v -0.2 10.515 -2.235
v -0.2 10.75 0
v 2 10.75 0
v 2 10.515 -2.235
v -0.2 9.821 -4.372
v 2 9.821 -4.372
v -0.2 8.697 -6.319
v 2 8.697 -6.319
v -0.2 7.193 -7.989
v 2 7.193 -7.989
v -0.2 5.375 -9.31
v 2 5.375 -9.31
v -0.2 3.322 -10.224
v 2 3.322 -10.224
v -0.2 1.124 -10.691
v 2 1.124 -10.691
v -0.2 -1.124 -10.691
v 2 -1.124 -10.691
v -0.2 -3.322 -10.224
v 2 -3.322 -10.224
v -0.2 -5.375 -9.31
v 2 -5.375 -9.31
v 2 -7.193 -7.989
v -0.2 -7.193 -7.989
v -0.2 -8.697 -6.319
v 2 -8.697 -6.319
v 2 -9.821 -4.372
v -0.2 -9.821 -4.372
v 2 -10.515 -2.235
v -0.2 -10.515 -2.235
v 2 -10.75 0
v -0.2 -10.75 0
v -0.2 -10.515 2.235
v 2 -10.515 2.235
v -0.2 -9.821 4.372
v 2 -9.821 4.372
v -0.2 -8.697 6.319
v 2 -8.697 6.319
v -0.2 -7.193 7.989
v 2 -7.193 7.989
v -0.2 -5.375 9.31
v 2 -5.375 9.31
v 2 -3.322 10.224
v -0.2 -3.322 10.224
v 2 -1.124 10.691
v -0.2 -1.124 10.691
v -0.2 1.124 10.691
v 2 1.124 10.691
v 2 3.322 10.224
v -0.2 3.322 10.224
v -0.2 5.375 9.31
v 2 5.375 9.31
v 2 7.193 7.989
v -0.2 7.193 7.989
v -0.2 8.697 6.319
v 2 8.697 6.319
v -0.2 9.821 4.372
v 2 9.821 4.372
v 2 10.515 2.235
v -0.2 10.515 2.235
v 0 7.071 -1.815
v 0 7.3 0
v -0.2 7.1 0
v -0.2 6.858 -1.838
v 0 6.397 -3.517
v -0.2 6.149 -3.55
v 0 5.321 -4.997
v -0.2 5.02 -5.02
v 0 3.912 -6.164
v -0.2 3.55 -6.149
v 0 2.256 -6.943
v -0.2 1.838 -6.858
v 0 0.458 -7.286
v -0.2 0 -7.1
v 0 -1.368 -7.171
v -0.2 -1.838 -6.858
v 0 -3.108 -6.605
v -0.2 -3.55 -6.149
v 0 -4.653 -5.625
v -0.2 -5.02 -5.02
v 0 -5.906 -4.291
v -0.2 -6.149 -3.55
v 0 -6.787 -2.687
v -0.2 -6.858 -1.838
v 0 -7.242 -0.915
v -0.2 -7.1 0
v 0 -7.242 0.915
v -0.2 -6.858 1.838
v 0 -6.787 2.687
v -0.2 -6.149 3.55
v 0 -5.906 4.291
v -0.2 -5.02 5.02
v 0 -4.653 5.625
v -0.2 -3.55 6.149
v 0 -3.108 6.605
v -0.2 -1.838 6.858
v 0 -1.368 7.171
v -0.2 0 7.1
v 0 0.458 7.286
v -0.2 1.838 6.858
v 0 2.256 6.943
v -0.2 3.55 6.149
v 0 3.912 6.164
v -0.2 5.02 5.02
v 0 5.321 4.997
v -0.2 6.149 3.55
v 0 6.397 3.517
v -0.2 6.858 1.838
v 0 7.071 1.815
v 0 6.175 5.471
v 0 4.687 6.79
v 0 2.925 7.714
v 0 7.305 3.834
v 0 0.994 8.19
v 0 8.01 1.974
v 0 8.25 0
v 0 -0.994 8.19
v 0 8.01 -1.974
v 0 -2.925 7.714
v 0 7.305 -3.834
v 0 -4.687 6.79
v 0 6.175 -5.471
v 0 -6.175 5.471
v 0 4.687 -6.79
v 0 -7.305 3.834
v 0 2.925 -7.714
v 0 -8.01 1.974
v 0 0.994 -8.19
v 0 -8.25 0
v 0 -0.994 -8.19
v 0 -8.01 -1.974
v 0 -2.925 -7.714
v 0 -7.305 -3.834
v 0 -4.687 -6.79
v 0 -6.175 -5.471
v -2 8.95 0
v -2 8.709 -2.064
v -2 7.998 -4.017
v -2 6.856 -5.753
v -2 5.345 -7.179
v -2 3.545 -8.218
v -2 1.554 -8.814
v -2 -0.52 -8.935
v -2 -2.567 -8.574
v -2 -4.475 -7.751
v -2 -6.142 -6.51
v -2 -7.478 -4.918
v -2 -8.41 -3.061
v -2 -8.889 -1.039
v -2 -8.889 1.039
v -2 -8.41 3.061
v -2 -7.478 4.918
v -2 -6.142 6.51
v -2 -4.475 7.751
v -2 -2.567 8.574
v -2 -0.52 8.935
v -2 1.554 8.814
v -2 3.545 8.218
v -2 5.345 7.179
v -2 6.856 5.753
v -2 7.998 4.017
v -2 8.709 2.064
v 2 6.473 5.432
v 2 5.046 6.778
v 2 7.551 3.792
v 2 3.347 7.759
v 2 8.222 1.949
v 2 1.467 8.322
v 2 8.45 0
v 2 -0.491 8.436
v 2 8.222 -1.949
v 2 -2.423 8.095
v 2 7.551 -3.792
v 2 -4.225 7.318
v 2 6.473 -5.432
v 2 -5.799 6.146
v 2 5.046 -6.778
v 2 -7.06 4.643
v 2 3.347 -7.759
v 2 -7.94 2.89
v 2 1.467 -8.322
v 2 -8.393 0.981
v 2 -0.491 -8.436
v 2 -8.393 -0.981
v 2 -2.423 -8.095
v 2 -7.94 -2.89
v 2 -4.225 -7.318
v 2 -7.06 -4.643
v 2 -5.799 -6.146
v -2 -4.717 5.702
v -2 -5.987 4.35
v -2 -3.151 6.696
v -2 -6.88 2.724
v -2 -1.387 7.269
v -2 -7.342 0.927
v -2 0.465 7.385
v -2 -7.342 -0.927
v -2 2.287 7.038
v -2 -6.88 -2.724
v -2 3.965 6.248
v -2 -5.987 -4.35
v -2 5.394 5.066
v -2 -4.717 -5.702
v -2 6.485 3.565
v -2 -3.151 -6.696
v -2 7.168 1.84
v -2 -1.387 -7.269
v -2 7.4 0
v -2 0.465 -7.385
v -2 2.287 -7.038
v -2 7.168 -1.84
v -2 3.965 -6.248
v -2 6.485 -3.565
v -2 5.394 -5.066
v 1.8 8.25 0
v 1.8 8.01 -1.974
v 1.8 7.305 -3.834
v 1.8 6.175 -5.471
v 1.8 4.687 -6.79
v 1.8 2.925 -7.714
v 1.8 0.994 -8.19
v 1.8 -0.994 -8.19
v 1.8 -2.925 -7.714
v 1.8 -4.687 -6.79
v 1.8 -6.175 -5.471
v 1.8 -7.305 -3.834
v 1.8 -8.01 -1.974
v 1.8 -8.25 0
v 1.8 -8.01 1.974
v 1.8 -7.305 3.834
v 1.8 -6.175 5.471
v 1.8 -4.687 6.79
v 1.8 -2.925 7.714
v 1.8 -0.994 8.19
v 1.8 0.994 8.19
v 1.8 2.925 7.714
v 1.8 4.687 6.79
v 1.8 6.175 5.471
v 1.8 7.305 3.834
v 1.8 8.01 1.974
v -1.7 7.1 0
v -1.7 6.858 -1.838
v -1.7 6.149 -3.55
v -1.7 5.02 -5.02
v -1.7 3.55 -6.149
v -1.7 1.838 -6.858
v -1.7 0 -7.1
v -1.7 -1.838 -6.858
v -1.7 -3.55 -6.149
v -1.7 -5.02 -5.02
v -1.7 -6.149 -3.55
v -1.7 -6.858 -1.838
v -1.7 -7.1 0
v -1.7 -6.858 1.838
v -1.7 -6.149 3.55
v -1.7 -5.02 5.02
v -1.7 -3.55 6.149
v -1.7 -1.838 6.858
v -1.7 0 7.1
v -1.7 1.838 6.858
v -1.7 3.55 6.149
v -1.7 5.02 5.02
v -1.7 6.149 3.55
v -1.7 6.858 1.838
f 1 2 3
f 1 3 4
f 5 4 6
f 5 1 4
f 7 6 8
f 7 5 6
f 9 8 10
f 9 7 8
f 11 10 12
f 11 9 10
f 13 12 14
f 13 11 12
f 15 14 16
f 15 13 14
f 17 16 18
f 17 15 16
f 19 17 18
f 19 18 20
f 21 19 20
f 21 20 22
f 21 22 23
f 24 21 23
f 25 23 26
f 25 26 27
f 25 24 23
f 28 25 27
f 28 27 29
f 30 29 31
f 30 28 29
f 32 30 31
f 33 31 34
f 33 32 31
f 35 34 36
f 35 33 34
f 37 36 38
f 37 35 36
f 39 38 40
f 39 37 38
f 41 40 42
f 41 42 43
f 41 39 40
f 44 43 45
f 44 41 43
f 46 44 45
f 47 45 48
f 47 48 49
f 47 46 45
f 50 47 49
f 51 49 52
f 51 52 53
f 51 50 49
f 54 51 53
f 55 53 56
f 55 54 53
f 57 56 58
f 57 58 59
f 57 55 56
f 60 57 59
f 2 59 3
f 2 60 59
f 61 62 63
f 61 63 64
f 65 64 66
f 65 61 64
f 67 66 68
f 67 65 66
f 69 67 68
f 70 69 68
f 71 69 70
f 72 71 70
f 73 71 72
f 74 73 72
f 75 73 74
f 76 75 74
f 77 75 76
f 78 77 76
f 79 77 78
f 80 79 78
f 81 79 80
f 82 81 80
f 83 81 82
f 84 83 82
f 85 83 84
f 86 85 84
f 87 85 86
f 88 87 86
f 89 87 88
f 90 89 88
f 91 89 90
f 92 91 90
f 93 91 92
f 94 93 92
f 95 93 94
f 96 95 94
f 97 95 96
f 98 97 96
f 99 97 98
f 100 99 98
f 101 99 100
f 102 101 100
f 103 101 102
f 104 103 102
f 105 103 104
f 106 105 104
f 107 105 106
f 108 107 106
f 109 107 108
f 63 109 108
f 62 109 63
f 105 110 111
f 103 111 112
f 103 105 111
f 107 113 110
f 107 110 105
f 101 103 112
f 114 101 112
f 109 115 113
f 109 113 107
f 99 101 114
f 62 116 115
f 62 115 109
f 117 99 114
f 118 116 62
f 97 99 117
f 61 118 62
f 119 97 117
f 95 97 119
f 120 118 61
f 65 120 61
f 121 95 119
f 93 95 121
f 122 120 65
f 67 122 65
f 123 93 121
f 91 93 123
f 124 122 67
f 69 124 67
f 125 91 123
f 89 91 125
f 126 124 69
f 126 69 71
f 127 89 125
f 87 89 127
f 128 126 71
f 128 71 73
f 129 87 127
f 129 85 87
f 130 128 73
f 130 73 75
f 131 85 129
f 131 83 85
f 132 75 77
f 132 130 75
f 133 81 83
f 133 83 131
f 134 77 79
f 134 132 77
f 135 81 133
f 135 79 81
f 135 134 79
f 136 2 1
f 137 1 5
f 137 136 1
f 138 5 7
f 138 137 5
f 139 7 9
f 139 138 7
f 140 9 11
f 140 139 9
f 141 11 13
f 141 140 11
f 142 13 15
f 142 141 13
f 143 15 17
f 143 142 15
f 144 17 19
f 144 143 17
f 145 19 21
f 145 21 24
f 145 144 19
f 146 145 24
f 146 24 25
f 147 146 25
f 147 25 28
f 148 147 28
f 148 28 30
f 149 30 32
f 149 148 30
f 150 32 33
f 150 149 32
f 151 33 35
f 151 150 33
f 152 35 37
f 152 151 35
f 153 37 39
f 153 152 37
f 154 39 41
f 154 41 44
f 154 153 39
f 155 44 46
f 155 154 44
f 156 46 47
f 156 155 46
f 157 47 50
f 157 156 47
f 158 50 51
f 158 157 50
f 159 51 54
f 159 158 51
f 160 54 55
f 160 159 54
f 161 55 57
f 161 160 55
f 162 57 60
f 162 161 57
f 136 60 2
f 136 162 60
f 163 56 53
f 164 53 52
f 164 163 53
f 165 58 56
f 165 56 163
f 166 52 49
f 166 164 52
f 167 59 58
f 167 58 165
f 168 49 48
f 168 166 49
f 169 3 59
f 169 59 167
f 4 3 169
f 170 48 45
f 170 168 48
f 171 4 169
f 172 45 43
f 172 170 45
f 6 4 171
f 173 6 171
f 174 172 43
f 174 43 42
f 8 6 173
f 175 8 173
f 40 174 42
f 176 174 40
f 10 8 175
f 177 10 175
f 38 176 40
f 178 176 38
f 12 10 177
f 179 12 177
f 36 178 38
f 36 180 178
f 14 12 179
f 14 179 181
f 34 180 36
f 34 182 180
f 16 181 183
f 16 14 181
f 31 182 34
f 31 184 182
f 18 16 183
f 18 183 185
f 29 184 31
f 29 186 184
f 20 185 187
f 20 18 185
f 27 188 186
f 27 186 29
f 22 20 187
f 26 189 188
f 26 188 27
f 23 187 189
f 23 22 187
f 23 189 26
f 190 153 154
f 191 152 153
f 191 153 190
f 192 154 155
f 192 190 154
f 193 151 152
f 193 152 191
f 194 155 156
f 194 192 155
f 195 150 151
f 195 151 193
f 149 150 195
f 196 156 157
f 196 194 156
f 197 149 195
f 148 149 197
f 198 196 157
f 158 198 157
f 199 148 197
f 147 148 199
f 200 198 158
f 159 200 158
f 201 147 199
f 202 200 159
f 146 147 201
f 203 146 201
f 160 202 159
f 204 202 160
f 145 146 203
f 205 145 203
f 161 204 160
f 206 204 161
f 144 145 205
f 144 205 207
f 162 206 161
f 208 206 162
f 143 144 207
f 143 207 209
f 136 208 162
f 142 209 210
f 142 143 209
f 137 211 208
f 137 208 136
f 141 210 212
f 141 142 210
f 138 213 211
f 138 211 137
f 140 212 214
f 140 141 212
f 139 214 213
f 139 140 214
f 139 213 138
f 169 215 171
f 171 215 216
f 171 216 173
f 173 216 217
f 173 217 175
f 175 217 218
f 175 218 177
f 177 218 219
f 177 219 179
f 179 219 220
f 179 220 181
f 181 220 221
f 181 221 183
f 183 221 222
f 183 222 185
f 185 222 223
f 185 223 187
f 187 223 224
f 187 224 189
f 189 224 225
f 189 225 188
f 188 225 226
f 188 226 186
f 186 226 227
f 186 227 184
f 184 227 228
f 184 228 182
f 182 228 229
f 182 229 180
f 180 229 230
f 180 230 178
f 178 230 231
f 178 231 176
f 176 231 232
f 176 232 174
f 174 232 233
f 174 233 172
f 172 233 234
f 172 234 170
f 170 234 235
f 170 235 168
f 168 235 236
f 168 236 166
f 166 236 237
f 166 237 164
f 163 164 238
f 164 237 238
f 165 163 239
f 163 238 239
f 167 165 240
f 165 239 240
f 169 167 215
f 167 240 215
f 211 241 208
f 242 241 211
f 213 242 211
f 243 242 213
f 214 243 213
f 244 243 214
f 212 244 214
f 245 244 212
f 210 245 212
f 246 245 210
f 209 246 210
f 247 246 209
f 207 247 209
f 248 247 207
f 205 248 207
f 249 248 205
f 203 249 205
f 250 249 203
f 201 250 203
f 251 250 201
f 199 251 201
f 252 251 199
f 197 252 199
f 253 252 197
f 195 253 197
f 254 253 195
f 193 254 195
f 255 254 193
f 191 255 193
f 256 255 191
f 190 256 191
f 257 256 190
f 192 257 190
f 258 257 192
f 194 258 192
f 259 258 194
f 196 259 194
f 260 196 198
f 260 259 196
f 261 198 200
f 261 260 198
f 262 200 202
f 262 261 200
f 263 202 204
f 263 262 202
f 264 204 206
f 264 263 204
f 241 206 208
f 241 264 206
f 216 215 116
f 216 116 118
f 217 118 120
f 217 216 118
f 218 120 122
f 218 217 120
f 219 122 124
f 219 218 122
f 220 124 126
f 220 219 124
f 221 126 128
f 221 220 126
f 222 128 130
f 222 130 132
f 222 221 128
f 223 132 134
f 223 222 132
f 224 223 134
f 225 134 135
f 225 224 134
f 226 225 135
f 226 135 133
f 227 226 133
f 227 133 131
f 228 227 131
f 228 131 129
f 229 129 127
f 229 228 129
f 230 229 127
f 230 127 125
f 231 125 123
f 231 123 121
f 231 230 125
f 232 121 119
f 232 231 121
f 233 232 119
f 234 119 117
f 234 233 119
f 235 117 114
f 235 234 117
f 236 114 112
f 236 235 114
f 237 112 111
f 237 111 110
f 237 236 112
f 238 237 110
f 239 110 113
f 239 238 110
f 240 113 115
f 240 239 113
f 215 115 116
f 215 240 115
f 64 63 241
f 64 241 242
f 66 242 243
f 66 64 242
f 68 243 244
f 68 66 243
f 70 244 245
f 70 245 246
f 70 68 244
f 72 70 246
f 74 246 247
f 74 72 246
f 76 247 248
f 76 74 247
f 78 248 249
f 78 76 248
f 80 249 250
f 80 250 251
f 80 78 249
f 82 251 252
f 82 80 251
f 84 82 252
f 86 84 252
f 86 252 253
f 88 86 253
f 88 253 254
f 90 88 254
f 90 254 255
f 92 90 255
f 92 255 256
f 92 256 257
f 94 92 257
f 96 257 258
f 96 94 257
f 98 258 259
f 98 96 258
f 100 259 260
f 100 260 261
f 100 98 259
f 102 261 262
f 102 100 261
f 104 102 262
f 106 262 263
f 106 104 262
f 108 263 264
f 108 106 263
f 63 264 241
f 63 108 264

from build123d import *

# Parameters (mm, degrees)
F2_SIZE = 1.8
F3_SIZE = 0.3
F4_SIZE = 0.2


with BuildPart() as f1:
    # F0 (on Top) → F1 (revolve)
    with BuildSketch(Plane.XY):
        Polygon((-2, 7.1), (0, 7.1), (0, 8.25), (2, 8.25), (2, 10.75), (-2, 10.75), align=None)
    revolve(axis=Axis((-1, 0, 0), (-1, 0, 0)))

    # F2
    f2_edges = [f1.edges().sort_by_distance(p)[0] for p in [
        (-2, -10.75, 0),
    ]]
    chamfer(f2_edges, length=F2_SIZE)

    # F3
    f3_edges = [f1.edges().sort_by_distance(p)[0] for p in [
        (-2, -7.1, 0),
    ]]
    chamfer(f3_edges, length=F3_SIZE)

    # F4
    f4_edges = [f1.edges().sort_by_distance(p)[0] for p in [
        (2, -8.25, 0),
        (0, -7.1, 0),
    ]]
    chamfer(f4_edges, length=F4_SIZE)


solid = f1.part
